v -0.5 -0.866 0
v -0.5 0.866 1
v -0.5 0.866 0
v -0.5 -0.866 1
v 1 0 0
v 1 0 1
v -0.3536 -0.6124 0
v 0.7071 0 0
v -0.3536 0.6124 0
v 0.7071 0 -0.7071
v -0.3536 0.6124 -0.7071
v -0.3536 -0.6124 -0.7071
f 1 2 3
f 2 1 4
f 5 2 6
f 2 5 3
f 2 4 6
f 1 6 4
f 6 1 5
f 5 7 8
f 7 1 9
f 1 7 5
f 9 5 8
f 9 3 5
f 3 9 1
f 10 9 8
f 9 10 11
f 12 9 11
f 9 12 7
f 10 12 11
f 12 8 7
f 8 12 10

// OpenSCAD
// Volume: 1.7583154200781177, SurfaceArea: 10.392296947284624
cube(1/0);
cube([0,0,1/0]);
cylinder(h=10, r=1/0);
cylinder(h=10, r1=1, r2=1/0);
cylinder(h=1/0);
sphere(1/0);
polygon([[0,0,0],[1,0,0],[1,1/0,0]]);
polyhedron(points = [[1/0,0,0],[-1,0,0],[0,1,0],[0,-1,0],[0,0,1],[0,0,-1]],
    triangles = [[0,4,2],[0,2,5],[0,3,4],[0,5,3],[1,2,4],[1,5,2],[1,4,3], [1,3,5]]);

cylinder($fn=1/0);
sphere($fn=1/0);
